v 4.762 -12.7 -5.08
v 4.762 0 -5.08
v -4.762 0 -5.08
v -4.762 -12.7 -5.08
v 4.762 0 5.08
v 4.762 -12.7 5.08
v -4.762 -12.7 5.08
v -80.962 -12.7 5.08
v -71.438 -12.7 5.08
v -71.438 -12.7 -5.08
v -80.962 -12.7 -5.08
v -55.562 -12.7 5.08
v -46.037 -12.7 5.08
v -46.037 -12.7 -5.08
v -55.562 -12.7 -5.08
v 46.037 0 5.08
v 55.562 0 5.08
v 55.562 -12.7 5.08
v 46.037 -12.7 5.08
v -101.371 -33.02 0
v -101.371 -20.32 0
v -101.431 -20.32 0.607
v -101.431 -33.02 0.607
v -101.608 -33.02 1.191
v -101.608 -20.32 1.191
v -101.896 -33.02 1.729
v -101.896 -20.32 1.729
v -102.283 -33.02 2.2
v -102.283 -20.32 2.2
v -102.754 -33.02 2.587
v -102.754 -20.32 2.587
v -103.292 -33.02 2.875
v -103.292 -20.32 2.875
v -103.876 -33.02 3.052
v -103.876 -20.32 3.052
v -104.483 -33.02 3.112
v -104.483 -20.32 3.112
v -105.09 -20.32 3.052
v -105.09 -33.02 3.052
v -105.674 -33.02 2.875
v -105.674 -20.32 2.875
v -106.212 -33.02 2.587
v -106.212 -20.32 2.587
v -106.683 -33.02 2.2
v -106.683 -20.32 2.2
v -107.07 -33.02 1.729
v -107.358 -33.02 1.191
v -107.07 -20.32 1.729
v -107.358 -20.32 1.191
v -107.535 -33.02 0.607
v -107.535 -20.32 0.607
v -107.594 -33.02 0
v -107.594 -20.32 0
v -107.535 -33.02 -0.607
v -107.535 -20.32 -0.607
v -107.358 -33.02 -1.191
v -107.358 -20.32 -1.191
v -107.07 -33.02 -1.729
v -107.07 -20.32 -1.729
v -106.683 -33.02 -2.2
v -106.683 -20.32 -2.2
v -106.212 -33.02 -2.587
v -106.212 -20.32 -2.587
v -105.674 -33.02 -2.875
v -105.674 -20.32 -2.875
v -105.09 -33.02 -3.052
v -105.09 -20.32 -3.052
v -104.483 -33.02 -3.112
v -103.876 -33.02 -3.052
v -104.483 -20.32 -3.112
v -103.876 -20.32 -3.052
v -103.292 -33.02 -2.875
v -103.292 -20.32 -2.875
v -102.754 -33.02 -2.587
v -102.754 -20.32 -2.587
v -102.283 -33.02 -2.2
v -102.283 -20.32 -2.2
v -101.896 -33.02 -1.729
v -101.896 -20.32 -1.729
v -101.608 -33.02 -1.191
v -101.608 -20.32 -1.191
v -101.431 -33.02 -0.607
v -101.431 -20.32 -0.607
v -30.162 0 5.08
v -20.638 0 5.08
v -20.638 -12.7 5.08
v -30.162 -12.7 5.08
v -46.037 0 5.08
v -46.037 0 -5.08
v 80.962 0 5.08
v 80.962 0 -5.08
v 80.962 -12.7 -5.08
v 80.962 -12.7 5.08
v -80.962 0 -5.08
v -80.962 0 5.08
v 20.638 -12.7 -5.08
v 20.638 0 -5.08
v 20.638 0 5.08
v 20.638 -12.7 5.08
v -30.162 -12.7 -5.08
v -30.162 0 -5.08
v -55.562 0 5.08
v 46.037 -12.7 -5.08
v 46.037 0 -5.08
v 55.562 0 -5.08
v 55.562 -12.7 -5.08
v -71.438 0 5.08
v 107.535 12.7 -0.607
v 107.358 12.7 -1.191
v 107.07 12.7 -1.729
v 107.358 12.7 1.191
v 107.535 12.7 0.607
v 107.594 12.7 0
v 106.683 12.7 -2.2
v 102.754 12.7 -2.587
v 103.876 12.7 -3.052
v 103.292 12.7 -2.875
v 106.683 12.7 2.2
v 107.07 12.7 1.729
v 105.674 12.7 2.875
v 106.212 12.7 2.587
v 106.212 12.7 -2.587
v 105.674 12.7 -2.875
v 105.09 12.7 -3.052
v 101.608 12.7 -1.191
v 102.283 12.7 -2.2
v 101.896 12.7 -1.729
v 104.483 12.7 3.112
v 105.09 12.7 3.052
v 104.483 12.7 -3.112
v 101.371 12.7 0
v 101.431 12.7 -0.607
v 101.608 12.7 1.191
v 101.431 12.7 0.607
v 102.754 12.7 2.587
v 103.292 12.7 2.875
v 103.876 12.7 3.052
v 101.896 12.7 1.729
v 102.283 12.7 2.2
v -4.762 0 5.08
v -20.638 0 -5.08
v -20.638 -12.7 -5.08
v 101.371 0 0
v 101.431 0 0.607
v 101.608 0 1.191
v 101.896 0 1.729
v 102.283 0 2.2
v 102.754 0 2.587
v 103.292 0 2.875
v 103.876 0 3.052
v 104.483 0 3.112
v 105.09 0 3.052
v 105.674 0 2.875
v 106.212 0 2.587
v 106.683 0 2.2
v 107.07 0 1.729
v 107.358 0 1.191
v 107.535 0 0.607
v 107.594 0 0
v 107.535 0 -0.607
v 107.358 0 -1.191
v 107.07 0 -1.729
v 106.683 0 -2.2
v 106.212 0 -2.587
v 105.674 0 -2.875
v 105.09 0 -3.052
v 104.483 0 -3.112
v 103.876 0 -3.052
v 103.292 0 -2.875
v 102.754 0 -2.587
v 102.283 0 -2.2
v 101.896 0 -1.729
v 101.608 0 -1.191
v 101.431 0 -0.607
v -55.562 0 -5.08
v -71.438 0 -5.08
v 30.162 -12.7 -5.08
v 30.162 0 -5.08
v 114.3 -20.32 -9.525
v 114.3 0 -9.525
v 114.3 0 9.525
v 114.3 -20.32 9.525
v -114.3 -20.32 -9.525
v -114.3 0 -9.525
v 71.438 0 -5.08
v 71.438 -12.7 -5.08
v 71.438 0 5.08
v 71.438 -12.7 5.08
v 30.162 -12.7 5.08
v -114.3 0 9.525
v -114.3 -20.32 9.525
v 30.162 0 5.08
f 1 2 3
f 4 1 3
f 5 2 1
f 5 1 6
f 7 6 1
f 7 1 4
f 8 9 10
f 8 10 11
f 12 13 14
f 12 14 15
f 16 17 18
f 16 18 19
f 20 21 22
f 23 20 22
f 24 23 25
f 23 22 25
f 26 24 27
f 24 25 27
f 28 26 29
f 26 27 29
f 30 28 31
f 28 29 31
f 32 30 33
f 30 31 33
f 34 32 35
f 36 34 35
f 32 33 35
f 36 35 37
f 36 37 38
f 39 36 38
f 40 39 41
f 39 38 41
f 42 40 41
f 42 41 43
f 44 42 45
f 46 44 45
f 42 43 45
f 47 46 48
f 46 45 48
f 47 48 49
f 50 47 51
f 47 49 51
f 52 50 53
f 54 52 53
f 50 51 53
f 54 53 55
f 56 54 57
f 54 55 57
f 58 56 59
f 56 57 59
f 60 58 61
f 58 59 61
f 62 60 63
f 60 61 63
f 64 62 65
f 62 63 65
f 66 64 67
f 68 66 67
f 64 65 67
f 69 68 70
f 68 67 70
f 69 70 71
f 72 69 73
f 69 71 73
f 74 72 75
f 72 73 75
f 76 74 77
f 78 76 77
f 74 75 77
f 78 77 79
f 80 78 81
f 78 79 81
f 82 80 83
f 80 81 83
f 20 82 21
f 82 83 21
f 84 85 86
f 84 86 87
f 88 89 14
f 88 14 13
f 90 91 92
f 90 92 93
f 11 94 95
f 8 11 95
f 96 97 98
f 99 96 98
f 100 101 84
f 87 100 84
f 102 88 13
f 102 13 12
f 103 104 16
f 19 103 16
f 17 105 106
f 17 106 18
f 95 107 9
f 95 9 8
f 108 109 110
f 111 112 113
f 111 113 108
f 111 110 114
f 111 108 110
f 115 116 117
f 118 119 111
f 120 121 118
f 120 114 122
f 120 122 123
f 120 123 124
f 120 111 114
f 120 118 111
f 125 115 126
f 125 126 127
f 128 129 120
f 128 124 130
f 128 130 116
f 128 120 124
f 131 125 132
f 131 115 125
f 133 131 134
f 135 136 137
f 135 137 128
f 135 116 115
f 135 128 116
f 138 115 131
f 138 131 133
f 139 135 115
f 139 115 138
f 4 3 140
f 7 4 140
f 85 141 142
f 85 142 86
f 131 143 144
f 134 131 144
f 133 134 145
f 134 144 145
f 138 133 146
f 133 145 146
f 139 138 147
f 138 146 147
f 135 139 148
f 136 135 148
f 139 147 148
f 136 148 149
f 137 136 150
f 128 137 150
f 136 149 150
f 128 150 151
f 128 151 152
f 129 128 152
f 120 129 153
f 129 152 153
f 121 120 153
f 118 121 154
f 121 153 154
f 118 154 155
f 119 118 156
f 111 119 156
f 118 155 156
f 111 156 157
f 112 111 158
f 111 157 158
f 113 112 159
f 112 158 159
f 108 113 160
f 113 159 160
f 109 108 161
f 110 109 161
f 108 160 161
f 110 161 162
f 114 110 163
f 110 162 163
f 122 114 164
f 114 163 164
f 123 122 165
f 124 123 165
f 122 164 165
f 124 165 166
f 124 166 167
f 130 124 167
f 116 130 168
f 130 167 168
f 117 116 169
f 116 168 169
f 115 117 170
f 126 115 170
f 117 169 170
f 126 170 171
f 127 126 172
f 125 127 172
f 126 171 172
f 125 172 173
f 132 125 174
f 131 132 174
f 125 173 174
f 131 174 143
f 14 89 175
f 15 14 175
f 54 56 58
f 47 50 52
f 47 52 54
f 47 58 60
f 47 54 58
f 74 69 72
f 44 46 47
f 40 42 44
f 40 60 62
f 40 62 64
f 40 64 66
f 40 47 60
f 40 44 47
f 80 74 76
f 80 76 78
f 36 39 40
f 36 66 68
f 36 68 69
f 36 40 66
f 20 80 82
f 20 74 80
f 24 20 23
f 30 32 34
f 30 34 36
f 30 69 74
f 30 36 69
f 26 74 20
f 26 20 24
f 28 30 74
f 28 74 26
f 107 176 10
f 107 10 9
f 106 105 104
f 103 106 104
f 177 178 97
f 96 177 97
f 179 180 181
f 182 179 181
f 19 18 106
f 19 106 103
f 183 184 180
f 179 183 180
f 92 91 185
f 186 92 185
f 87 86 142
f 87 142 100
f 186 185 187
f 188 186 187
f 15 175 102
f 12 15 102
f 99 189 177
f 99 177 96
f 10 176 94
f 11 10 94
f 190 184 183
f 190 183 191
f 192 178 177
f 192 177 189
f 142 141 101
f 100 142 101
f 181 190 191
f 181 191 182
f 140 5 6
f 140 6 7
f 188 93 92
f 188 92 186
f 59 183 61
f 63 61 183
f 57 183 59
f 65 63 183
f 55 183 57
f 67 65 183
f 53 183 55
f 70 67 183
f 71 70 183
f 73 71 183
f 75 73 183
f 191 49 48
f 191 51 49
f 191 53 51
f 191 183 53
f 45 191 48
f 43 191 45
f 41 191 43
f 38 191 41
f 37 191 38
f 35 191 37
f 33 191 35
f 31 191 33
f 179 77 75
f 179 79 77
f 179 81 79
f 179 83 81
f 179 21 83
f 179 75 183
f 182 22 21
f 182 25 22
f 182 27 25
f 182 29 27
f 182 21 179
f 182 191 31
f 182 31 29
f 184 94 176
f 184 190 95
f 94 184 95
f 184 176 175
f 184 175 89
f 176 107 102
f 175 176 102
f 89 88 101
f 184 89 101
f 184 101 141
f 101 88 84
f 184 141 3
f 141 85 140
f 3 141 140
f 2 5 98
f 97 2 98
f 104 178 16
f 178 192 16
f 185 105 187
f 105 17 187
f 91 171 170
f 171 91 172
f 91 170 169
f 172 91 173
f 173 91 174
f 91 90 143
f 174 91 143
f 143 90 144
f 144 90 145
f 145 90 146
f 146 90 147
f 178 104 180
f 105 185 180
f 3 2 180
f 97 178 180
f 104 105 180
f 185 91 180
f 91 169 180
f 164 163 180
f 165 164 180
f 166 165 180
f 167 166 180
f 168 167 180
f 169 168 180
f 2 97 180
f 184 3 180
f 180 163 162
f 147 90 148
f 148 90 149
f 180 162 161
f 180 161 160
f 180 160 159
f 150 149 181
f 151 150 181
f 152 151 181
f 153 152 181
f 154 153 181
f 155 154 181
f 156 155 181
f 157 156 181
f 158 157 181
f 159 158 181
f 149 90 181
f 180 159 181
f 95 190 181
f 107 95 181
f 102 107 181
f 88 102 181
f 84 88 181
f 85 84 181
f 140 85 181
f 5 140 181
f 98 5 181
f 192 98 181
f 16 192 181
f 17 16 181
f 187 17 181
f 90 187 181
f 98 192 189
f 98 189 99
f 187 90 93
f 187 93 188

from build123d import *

# Parameters (mm, degrees)
F0_W     = 228.6
F0_H     = 19.05
F1_DEPTH = 20.32
F3_W     = 9.525
F3_H     = 10.16
F4_DEPTH = 12.7
F2_R     = 3.1115
F5_DEPTH = 12.7
F6_R     = 3.1115
F7_DEPTH = 12.7


with BuildPart() as f1:
    # F0 (on Front) → F1 (new body)
    with BuildSketch(Plane.XZ):
        Rectangle(F0_W, F0_H)
    extrude(amount=F1_DEPTH)

    # F3 (on face) → F4 (cut)
    with BuildSketch(Plane(origin=(0, 0, 0), x_dir=(-1, 0, 0), z_dir=(0, 1, 0))):
        Rectangle(F3_W, F3_H)
        with Locations((25.4, 0)):
            Rectangle(F3_W, F3_H)
        with Locations((50.8, 0)):
            Rectangle(F3_W, F3_H)
        with Locations((-25.4, 0)):
            Rectangle(F3_W, F3_H)
        with Locations((-50.8, 0)):
            Rectangle(F3_W, F3_H)
        with Locations((-76.2, 0)):
            Rectangle(F3_W, F3_H)
        with Locations((76.2, 0)):
            Rectangle(F3_W, F3_H)
    extrude(amount=-F4_DEPTH, mode=Mode.SUBTRACT)

    # F2 (on face) → F5 (join)
    with BuildSketch(Plane.XZ.offset(20.32)):
        with Locations((-104.4829, 0)):
            Circle(F2_R)
    extrude(amount=F5_DEPTH)

    # F6 (on face) → F7 (join)
    with BuildSketch(Plane(origin=(0, 0, 0), x_dir=(-1, 0, 0), z_dir=(0, 1, 0))):
        with Locations((-104.4829, 0)):
            Circle(F6_R)
    extrude(amount=F7_DEPTH)


solid = f1.part
